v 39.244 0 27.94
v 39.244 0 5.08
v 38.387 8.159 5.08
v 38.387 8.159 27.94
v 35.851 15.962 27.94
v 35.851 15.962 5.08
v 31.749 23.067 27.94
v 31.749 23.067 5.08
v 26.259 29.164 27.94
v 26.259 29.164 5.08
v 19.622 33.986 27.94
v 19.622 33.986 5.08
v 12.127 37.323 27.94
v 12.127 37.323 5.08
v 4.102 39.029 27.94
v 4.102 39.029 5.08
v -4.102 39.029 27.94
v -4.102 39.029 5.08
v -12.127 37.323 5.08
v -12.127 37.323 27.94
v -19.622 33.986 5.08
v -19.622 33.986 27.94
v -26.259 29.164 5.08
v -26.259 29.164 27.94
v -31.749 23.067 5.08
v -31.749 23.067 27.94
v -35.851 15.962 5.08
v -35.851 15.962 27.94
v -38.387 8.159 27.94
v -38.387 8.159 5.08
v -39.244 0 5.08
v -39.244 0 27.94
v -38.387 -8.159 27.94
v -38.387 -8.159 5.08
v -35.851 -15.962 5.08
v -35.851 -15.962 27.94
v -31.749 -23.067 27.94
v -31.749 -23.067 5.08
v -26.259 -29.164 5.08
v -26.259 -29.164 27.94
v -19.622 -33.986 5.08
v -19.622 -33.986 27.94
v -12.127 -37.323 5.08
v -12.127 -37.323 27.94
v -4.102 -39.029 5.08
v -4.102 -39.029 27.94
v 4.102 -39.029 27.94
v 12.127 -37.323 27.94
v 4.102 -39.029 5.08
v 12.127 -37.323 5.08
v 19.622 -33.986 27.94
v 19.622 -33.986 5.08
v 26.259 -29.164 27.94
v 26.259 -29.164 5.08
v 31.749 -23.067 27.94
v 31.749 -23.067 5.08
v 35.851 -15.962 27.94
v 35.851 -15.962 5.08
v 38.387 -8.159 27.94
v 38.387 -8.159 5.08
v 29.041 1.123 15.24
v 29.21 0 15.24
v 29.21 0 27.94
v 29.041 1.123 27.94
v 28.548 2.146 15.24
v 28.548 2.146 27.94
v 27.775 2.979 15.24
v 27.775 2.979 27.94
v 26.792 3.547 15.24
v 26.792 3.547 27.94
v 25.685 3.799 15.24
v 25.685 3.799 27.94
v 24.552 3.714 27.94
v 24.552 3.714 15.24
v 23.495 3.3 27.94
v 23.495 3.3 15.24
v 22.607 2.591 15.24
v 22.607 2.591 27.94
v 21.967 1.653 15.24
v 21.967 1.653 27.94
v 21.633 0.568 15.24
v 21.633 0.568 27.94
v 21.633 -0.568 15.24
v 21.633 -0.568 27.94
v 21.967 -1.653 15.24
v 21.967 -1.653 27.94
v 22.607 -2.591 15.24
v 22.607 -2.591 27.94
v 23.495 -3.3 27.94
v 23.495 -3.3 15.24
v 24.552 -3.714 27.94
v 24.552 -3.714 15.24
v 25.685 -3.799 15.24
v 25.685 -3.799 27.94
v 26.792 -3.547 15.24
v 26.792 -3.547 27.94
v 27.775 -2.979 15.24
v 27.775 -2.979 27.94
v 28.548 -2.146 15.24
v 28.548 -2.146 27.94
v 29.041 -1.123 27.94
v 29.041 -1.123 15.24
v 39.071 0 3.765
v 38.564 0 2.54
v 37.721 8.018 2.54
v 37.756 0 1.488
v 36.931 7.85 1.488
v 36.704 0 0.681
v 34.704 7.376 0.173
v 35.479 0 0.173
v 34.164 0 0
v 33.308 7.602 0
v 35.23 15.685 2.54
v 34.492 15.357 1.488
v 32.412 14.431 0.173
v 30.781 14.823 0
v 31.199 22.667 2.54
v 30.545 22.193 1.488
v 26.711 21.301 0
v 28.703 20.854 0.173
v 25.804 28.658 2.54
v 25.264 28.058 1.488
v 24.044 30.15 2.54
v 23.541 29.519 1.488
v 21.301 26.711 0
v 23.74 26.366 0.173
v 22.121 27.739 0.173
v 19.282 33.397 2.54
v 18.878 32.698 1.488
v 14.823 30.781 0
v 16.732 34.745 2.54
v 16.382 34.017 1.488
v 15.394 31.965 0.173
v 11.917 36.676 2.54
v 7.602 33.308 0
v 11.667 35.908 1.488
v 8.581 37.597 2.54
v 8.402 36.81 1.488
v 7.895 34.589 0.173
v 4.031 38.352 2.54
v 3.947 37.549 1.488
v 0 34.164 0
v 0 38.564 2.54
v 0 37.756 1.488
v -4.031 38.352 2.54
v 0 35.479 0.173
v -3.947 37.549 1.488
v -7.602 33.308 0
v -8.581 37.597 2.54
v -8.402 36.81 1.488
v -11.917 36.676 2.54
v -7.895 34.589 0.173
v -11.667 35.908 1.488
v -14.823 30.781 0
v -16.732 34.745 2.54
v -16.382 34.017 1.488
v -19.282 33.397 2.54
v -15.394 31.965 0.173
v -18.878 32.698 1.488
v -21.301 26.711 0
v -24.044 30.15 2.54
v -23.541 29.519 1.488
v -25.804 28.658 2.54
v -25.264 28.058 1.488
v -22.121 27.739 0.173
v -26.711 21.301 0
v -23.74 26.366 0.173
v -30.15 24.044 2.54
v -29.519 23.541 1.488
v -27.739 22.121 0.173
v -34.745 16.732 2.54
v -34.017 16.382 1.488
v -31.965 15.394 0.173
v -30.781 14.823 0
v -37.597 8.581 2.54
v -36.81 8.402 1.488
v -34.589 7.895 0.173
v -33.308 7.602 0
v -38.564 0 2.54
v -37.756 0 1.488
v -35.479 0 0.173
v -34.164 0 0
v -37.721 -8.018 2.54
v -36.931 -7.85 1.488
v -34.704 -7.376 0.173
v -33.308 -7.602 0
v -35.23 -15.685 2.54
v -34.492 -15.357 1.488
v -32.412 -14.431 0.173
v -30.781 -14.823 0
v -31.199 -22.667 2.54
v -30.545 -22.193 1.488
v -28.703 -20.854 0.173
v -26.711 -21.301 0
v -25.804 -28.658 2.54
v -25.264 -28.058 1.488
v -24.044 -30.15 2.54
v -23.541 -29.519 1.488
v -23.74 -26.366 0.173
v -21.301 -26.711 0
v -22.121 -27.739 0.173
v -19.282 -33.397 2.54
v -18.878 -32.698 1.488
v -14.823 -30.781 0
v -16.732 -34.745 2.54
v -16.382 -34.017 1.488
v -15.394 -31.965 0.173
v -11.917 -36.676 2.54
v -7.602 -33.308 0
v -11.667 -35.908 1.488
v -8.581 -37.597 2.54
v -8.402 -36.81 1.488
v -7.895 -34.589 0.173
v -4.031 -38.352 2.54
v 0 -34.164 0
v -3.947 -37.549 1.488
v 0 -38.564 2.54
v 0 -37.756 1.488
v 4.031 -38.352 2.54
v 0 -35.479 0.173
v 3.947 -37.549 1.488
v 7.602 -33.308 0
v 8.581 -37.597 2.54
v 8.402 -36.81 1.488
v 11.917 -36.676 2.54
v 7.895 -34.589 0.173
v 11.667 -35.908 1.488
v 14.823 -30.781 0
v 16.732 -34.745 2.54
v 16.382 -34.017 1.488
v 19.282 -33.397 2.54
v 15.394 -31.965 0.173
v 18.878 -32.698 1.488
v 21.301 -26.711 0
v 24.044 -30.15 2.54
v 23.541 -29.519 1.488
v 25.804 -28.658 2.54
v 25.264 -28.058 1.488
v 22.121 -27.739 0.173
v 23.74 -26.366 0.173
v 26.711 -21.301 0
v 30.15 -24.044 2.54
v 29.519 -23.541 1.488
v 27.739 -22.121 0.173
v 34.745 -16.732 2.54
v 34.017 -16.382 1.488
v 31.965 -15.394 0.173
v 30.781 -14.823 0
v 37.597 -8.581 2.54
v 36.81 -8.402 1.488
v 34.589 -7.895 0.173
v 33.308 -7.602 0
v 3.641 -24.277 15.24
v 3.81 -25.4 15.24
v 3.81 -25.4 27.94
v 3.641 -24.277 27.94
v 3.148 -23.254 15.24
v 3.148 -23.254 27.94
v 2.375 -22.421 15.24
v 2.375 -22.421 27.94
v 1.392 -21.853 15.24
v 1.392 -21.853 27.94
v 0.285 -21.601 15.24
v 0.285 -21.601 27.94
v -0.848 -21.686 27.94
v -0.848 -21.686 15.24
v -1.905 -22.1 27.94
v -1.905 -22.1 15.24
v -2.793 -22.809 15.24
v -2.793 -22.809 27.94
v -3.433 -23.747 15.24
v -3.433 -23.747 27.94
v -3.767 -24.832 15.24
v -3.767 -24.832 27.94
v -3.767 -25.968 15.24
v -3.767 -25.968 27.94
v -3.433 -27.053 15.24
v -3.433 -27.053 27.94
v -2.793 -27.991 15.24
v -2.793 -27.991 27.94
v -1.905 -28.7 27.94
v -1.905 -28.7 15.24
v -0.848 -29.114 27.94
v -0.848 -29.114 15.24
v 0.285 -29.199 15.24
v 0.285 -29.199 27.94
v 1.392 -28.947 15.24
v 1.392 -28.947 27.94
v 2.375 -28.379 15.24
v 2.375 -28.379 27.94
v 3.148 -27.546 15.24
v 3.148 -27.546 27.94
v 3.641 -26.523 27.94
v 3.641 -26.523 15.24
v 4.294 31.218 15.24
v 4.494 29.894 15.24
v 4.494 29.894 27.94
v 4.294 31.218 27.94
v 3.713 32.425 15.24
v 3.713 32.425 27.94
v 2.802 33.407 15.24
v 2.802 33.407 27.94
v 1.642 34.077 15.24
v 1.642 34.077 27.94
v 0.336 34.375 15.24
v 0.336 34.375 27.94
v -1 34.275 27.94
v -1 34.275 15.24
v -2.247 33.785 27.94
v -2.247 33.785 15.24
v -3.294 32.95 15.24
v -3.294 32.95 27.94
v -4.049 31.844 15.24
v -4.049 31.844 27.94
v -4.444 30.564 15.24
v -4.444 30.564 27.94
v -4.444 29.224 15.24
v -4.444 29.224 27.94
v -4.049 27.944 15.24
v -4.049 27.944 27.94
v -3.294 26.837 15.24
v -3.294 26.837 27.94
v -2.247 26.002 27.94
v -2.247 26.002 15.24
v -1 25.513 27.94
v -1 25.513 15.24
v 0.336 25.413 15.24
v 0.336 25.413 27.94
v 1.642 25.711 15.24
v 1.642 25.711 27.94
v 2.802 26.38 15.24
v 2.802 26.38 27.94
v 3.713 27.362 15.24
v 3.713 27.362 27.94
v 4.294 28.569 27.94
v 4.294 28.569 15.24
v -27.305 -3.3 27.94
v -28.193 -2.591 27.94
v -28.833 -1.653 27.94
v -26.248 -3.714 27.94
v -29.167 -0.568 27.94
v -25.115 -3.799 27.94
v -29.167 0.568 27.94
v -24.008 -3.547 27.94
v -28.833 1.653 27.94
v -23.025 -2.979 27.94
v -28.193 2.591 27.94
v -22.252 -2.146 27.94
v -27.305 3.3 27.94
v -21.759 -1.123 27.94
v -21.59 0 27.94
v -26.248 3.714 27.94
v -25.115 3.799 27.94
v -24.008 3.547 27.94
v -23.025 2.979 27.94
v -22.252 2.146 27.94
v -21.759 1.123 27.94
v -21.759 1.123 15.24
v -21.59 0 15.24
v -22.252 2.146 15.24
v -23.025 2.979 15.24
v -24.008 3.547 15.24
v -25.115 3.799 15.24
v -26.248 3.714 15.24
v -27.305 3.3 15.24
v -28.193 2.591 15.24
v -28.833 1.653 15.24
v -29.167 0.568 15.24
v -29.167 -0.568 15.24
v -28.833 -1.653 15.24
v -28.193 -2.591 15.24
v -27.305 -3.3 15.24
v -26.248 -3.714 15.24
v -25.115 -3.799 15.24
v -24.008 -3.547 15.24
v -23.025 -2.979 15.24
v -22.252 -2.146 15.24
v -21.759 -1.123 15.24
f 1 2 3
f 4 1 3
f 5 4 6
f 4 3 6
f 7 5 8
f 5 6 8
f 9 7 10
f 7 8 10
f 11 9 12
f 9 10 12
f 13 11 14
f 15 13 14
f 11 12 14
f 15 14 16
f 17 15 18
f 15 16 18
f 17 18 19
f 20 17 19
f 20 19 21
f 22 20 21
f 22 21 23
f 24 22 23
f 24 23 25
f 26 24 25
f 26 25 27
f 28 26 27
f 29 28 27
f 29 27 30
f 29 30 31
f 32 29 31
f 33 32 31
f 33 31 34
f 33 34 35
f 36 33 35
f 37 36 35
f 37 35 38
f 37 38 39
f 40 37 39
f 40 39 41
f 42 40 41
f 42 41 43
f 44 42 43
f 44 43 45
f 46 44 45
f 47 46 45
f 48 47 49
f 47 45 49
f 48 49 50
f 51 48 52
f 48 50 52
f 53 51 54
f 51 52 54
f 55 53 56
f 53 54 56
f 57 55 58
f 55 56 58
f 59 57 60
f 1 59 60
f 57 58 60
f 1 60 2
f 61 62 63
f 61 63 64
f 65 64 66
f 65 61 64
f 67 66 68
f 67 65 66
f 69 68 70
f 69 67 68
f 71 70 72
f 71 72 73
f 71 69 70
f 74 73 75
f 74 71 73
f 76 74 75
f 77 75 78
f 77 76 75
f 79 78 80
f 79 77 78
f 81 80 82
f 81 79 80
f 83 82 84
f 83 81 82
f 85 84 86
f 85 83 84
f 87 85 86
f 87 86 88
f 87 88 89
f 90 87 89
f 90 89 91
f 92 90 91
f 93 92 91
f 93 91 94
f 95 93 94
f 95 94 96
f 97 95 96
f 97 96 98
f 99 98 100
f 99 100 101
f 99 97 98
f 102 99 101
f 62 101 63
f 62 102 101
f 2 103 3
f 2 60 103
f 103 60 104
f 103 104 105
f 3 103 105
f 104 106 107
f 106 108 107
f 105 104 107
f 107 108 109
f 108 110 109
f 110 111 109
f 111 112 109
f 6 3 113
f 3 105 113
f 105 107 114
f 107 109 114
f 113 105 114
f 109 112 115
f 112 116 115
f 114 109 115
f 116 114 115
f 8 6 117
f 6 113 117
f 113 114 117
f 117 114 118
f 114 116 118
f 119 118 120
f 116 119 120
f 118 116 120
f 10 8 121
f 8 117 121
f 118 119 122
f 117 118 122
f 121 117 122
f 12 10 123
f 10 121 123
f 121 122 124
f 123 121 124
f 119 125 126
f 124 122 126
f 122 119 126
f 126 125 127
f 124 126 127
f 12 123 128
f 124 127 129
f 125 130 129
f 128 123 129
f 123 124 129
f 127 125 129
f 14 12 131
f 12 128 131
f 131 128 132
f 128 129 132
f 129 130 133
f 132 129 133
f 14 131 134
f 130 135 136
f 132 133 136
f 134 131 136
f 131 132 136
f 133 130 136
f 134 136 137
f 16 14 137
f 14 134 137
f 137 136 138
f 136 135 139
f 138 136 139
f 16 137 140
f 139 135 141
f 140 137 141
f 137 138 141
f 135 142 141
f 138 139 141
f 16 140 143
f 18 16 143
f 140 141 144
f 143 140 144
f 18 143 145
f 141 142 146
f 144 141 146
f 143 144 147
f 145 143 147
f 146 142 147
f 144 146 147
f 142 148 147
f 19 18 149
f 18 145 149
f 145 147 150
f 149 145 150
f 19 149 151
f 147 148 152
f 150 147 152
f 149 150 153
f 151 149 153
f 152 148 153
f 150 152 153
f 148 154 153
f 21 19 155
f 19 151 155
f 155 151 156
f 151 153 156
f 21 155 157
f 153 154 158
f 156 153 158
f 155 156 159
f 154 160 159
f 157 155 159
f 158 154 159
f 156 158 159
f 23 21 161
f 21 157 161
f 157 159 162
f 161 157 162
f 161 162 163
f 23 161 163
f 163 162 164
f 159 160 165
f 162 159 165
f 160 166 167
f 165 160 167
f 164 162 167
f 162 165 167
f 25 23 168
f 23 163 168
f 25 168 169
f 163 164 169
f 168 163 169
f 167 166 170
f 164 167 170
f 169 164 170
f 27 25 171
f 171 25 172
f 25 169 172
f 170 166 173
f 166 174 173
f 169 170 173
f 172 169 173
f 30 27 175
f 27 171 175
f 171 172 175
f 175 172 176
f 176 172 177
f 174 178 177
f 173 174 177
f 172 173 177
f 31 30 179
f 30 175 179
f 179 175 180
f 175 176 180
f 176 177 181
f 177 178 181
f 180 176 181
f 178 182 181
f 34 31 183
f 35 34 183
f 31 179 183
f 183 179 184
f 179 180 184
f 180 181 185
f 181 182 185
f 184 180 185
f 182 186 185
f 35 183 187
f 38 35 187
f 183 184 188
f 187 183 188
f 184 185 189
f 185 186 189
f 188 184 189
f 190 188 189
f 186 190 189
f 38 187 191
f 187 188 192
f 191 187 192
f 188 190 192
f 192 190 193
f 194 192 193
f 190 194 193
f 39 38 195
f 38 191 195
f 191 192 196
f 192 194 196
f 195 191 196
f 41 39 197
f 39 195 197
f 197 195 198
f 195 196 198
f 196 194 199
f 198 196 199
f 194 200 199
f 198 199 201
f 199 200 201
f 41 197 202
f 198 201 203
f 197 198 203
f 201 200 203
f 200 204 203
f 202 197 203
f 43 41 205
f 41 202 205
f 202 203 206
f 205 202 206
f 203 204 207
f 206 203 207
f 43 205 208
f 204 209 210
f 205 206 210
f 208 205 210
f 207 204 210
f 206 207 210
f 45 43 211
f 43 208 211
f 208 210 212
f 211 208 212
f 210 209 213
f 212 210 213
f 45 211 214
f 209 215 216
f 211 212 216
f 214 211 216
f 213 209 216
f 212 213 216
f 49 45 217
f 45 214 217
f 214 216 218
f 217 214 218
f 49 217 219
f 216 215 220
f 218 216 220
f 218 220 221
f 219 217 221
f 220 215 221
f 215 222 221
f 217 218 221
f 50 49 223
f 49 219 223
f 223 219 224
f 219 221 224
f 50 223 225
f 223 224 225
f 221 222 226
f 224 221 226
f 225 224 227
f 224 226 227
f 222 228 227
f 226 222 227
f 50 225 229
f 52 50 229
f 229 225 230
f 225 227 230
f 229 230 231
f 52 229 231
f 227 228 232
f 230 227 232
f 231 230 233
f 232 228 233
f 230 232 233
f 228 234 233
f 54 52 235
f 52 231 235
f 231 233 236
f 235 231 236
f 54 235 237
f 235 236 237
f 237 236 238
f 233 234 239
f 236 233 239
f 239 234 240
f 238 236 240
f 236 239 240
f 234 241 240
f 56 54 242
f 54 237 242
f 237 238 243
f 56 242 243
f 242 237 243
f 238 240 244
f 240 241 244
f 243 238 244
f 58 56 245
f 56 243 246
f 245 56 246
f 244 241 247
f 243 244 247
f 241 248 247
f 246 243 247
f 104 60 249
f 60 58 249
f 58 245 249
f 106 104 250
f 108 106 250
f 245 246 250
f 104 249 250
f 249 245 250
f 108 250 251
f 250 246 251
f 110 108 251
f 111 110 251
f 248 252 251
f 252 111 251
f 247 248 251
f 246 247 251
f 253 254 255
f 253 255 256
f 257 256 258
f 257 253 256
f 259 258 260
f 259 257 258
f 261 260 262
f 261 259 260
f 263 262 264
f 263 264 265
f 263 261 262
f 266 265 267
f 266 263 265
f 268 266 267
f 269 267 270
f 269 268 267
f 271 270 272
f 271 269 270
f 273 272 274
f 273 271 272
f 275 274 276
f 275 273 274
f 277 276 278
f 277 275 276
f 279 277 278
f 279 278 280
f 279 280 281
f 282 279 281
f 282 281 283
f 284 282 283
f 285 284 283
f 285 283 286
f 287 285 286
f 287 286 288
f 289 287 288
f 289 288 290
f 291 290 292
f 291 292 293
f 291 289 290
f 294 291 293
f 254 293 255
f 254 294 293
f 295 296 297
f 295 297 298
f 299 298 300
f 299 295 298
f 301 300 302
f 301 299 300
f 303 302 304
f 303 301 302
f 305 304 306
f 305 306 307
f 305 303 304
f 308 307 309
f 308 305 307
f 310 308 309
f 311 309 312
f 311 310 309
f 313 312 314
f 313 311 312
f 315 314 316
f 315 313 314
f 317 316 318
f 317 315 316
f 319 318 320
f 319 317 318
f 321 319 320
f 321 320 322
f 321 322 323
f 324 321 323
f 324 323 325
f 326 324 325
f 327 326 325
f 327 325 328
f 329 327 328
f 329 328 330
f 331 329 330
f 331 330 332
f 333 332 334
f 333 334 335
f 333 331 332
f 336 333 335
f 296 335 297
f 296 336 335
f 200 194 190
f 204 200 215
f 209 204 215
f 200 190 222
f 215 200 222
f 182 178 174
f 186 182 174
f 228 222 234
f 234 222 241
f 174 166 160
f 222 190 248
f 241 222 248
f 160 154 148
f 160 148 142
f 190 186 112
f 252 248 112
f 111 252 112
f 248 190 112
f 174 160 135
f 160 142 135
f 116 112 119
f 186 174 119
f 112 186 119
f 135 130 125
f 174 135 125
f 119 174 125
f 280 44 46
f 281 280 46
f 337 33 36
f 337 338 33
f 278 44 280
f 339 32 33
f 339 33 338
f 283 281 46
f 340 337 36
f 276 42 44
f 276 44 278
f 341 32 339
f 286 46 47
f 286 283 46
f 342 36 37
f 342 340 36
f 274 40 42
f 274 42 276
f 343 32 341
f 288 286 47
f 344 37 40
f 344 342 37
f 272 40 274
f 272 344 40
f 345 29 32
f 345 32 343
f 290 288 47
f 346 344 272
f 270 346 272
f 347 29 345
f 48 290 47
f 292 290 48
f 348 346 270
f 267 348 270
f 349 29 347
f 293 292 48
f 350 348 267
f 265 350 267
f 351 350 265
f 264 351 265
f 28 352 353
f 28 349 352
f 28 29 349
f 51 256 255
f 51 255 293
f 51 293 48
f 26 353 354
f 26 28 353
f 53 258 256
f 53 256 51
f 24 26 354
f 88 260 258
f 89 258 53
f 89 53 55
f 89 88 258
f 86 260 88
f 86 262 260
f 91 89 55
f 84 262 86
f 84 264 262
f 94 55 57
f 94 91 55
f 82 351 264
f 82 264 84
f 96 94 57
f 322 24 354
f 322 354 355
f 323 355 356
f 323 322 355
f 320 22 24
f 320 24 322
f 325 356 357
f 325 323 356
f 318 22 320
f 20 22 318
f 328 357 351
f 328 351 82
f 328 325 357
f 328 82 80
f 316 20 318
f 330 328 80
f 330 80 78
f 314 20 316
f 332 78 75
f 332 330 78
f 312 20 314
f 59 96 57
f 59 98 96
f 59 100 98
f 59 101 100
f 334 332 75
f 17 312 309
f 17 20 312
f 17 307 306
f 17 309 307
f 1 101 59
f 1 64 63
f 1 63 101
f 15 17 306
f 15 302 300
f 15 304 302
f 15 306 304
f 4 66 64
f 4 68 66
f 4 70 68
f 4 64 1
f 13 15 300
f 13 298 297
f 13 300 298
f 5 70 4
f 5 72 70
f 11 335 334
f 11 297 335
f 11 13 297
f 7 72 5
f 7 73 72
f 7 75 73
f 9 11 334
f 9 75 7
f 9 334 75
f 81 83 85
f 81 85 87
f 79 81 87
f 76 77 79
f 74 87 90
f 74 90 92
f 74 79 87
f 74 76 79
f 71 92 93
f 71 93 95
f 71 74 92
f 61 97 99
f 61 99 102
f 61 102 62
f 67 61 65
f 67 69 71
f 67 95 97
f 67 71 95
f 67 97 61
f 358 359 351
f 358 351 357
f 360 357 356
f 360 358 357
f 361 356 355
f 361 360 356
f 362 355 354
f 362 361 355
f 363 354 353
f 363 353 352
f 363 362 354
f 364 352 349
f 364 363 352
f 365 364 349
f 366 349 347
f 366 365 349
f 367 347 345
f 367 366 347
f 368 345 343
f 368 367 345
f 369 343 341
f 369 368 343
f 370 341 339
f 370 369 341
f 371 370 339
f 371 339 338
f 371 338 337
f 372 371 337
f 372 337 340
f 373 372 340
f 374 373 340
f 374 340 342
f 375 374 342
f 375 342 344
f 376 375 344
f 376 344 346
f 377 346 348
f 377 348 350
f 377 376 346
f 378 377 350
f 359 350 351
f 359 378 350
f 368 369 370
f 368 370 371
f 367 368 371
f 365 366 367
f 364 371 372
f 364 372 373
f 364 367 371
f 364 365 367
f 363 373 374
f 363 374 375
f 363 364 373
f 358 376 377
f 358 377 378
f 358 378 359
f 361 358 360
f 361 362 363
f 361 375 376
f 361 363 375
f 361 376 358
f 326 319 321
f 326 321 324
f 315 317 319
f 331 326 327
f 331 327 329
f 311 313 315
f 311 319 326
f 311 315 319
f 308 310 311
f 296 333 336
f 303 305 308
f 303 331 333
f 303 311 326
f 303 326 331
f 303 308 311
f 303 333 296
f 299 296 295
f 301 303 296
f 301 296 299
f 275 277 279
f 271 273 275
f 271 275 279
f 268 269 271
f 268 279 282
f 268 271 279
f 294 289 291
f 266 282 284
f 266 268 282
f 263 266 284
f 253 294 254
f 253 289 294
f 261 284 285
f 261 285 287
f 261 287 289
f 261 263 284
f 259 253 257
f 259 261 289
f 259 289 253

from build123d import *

# Parameters (mm, degrees)
F0_R     = 39.244095
F1_DEPTH = 15.24
F3_R     = 39.244095
F3_R_2   = 3.81
F3_R_3   = 4.493743
F4_DEPTH = 12.7
F5_R     = 5.08


with BuildPart() as f1:
    # F0 (on Top) → F1 (new body)
    with BuildSketch(Plane.XY):
        Circle(F0_R)
    extrude(amount=F1_DEPTH)

    # F3 (on face) → F4 (join)
    with BuildSketch(Plane.XY.offset(15.24)):
        Circle(F3_R)
        with Locations((0, -25.4)):
            Circle(F3_R_2, mode=Mode.SUBTRACT)
        with Locations((-25.4, 0)):
            Circle(F3_R_2, mode=Mode.SUBTRACT)
        with Locations((25.4, 0)):
            Circle(F3_R_2, mode=Mode.SUBTRACT)
        with Locations((0, 29.893743)):
            Circle(F3_R_3, mode=Mode.SUBTRACT)
    extrude(amount=F4_DEPTH)

    # F5
    f5_edges = [f1.edges().sort_by_distance(p)[0] for p in [
        (-39.244095, 0, 0),
    ]]
    fillet(f5_edges, radius=F5_R)


solid = f1.part
